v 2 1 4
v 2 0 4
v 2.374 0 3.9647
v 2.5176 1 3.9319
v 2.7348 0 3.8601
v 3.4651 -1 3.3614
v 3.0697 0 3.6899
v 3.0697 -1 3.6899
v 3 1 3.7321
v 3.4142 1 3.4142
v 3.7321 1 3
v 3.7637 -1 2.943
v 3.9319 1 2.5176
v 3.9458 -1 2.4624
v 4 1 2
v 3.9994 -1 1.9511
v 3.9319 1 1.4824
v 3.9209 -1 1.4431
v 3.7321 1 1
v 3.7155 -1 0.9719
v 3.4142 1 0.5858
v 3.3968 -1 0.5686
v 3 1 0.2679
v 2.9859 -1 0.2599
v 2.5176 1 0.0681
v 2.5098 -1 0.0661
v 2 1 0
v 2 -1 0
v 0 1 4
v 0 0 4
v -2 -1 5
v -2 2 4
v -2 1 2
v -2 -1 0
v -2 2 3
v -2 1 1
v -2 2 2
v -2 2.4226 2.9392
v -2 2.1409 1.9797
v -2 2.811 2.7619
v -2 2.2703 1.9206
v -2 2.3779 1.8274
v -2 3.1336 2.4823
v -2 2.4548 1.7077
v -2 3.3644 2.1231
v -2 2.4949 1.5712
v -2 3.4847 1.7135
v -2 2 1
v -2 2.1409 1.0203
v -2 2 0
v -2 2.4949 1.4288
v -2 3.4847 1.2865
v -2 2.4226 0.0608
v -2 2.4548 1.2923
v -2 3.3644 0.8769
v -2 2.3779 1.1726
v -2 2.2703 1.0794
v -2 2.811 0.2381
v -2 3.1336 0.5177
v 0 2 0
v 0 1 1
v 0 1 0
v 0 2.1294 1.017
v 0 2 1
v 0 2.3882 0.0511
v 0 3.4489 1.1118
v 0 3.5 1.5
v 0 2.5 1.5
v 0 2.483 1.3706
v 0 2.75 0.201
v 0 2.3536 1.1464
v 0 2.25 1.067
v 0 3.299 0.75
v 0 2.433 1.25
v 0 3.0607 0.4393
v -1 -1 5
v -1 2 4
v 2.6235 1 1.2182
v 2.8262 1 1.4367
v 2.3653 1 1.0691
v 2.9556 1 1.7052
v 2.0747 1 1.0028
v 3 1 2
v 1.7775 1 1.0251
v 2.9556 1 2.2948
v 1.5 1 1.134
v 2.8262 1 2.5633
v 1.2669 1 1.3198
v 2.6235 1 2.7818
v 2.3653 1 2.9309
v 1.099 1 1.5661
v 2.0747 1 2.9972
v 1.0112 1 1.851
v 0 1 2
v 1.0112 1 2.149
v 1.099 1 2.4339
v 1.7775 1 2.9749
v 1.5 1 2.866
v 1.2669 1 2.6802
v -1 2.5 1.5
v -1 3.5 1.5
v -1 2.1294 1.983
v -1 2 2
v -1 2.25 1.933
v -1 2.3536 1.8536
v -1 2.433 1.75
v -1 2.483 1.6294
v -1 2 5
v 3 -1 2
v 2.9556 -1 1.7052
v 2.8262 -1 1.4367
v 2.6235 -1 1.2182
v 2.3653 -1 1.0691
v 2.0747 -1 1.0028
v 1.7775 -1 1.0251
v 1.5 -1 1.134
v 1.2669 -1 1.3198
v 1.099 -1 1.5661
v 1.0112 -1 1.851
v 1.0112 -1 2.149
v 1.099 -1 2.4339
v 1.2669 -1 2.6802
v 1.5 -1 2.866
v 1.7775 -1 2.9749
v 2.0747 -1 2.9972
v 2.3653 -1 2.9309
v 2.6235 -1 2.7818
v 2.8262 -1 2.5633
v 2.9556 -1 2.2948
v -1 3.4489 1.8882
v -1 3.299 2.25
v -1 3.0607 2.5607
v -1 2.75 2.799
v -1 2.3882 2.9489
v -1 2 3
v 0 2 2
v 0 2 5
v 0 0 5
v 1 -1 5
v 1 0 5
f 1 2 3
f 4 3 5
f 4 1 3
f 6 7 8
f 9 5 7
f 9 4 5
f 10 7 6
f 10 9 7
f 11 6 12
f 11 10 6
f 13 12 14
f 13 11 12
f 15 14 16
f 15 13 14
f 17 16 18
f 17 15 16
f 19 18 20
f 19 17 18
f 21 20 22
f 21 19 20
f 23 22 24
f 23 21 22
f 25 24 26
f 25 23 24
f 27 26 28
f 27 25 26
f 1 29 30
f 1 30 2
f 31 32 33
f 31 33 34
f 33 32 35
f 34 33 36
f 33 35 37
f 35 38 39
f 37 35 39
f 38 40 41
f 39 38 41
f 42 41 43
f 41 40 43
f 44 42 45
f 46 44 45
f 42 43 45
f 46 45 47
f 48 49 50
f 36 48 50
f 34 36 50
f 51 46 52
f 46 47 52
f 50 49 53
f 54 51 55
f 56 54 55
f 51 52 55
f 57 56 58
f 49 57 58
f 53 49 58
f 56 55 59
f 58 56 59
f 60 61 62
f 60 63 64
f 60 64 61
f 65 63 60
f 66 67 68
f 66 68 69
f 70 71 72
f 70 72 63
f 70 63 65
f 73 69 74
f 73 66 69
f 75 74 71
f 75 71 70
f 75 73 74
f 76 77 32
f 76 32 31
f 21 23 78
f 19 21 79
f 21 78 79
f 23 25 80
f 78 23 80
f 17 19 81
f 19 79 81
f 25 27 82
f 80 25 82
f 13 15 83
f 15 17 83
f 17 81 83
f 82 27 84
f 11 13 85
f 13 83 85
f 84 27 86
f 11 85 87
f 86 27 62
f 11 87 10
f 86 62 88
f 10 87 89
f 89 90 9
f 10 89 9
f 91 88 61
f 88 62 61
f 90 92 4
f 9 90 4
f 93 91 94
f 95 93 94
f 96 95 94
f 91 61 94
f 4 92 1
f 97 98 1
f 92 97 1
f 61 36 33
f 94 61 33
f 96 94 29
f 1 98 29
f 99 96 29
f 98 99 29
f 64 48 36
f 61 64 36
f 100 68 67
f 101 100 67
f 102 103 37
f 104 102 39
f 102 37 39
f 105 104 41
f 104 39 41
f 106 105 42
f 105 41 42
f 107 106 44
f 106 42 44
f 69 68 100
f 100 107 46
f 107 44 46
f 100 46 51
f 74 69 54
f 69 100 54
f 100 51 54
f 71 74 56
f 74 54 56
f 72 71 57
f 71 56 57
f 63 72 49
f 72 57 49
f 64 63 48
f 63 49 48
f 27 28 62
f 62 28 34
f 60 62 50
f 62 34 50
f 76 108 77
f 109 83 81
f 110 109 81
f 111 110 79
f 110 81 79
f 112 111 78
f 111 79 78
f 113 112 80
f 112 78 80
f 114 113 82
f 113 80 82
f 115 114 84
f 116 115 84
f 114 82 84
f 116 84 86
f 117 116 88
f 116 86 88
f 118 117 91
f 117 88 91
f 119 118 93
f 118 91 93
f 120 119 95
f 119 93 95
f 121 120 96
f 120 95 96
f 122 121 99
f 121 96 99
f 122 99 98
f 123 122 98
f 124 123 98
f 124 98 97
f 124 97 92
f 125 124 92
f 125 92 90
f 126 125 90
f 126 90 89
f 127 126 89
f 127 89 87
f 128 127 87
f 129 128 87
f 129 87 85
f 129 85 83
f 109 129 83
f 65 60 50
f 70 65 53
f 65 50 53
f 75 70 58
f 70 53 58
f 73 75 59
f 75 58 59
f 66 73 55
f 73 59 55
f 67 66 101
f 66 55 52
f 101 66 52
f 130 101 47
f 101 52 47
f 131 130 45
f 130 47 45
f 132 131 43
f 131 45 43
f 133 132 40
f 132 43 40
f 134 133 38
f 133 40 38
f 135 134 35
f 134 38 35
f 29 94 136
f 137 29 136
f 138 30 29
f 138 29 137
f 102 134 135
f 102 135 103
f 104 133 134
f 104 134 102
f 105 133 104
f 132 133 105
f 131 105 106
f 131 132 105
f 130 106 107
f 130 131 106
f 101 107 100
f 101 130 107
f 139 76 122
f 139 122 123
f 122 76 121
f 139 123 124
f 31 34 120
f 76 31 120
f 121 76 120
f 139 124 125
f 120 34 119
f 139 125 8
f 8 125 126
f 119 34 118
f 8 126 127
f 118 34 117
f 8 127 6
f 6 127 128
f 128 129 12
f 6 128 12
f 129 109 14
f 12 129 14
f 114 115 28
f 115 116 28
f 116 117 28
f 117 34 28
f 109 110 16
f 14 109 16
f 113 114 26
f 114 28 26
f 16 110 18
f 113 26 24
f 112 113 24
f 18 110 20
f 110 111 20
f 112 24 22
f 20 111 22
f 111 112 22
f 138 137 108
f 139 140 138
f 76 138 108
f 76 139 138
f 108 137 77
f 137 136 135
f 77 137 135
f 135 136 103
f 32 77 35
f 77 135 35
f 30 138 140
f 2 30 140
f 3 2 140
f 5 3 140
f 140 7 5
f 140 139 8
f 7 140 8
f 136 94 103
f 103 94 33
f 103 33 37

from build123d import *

# Parameters (mm, degrees)
SKETCH1_W           = 4
SKETCH1_H           = 2
BOSS_EXTRUDE1_DEPTH = 4
BOSS_EXTRUDE2_DEPTH = 2
SKETCH3_R           = 1
CUT_EXTRUDE1_DEPTH  = 3
BOSS_EXTRUDE4_DEPTH = 2
CUT_EXTRUDE2_DEPTH  = 1
SKETCH8_W           = 1
SKETCH8_H           = 2
BOSS_EXTRUDE5_DEPTH = 2
CUT_EXTRUDE3_DEPTH  = 1
BOSS_EXTRUDE6_DEPTH = 1
BOSS_EXTRUDE7_DEPTH = 1
BOSS_EXTRUDE8_DEPTH = 1


with BuildPart() as part:
    # Sketch1 → Boss-Extrude1 (new body)
    with BuildSketch(Plane.XY):
        Rectangle(SKETCH1_W, SKETCH1_H)
    extrude(amount=BOSS_EXTRUDE1_DEPTH)

    # Sketch2 → Boss-Extrude2 (add)
    with BuildSketch(Plane(origin=(0, 1, 0), x_dir=(1, 0, 0), z_dir=(0, 1, 0))):
        with BuildLine():
            Line((2, 0), (2, -4))
            ThreePointArc((2, -4), (4, -2), (2, 0))
        make_face()
    extrude(amount=-BOSS_EXTRUDE2_DEPTH)

    # Sketch3 → Cut-Extrude1 (cut, through all)
    with BuildSketch(Plane(origin=(0, 1, 0), x_dir=(1, 0, 0), z_dir=(0, 1, 0))):
        with Locations((2, -2)):
            Circle(SKETCH3_R)
    extrude(amount=-CUT_EXTRUDE1_DEPTH, mode=Mode.SUBTRACT)

    # Sketch4 → Boss-Extrude4 (add)
    with BuildSketch(Plane.ZY.offset(2)):
        with BuildLine():
            Line((0, 1), (0, 2))
            ThreePointArc((0, 2), (1.5, 3.5), (3, 2))
            Line((3, 2), (3, 1))
            Line((3, 1), (2, 1))
            Line((2, 1), (2, 2))
            ThreePointArc((2, 2), (1.5, 2.5), (1, 2))
            Line((1, 2), (1, 1))
            Line((1, 1), (0, 1))
        make_face()
    extrude(amount=-BOSS_EXTRUDE4_DEPTH)

    # Sketch7 → Cut-Extrude2 (cut)
    with BuildSketch(Plane(origin=(0, 0, 0), x_dir=(0, 0, -1), z_dir=(1, 0, 0))):
        with BuildLine():
            Line((-1.5, 2.5), (-1.5, 3.5))
            ThreePointArc((-1.5, 3.5), (-2.560660172, 3.060660172), (-3, 2))
            Line((-3, 2), (-2, 2))
            ThreePointArc((-2, 2), (-1.853553391, 2.353553391), (-1.5, 2.5))
        make_face()
    extrude(amount=-CUT_EXTRUDE2_DEPTH, mode=Mode.SUBTRACT)

    # Sketch8 → Boss-Extrude5 (add)
    with BuildSketch(Plane.ZY.offset(2)):
        with Locations((4.5, 0)):
            Rectangle(SKETCH8_W, SKETCH8_H)
    extrude(amount=-BOSS_EXTRUDE5_DEPTH)

    # Sketch9 → Cut-Extrude3 (cut)
    with BuildSketch(Plane.ZY.offset(2)):
        Polygon((5, 1), (4, 1), (5, -1), align=None)
    extrude(amount=-CUT_EXTRUDE3_DEPTH, mode=Mode.SUBTRACT)

    # Sketch10 → Boss-Extrude6 (add)
    with BuildSketch(Plane(origin=(0, -1, 0), x_dir=(-1, 0, 0), z_dir=(0, -1, 0))):
        with BuildLine():
            Line((0, -5), (-1, -5))
            Line((-1, -5), (-3.069693846, -3.689897949))
            ThreePointArc((-3.069693846, -3.689897949), (-2.556868074, -3.920910708), (-2, -4))
            Line((-2, -4), (0, -4))
            Line((0, -4), (0, -5))
        make_face()
    extrude(amount=-BOSS_EXTRUDE6_DEPTH)

    # Sketch11 → Boss-Extrude7 (add)
    with BuildSketch(Plane(origin=(0, 1, 0), x_dir=(1, 0, 0), z_dir=(0, 1, 0))):
        Polygon((0, -3), (0, -5), (-1, -5), (-1, -4), (-2, -4), (-2, -3), align=None)
    extrude(amount=BOSS_EXTRUDE7_DEPTH)

    # Sketch12 → Boss-Extrude8 (add)
    with BuildSketch(Plane.ZY.offset(1)):
        Polygon((4, 2), (5, -1), (4, 1), align=None)
    extrude(amount=BOSS_EXTRUDE8_DEPTH)


solid = part.part
